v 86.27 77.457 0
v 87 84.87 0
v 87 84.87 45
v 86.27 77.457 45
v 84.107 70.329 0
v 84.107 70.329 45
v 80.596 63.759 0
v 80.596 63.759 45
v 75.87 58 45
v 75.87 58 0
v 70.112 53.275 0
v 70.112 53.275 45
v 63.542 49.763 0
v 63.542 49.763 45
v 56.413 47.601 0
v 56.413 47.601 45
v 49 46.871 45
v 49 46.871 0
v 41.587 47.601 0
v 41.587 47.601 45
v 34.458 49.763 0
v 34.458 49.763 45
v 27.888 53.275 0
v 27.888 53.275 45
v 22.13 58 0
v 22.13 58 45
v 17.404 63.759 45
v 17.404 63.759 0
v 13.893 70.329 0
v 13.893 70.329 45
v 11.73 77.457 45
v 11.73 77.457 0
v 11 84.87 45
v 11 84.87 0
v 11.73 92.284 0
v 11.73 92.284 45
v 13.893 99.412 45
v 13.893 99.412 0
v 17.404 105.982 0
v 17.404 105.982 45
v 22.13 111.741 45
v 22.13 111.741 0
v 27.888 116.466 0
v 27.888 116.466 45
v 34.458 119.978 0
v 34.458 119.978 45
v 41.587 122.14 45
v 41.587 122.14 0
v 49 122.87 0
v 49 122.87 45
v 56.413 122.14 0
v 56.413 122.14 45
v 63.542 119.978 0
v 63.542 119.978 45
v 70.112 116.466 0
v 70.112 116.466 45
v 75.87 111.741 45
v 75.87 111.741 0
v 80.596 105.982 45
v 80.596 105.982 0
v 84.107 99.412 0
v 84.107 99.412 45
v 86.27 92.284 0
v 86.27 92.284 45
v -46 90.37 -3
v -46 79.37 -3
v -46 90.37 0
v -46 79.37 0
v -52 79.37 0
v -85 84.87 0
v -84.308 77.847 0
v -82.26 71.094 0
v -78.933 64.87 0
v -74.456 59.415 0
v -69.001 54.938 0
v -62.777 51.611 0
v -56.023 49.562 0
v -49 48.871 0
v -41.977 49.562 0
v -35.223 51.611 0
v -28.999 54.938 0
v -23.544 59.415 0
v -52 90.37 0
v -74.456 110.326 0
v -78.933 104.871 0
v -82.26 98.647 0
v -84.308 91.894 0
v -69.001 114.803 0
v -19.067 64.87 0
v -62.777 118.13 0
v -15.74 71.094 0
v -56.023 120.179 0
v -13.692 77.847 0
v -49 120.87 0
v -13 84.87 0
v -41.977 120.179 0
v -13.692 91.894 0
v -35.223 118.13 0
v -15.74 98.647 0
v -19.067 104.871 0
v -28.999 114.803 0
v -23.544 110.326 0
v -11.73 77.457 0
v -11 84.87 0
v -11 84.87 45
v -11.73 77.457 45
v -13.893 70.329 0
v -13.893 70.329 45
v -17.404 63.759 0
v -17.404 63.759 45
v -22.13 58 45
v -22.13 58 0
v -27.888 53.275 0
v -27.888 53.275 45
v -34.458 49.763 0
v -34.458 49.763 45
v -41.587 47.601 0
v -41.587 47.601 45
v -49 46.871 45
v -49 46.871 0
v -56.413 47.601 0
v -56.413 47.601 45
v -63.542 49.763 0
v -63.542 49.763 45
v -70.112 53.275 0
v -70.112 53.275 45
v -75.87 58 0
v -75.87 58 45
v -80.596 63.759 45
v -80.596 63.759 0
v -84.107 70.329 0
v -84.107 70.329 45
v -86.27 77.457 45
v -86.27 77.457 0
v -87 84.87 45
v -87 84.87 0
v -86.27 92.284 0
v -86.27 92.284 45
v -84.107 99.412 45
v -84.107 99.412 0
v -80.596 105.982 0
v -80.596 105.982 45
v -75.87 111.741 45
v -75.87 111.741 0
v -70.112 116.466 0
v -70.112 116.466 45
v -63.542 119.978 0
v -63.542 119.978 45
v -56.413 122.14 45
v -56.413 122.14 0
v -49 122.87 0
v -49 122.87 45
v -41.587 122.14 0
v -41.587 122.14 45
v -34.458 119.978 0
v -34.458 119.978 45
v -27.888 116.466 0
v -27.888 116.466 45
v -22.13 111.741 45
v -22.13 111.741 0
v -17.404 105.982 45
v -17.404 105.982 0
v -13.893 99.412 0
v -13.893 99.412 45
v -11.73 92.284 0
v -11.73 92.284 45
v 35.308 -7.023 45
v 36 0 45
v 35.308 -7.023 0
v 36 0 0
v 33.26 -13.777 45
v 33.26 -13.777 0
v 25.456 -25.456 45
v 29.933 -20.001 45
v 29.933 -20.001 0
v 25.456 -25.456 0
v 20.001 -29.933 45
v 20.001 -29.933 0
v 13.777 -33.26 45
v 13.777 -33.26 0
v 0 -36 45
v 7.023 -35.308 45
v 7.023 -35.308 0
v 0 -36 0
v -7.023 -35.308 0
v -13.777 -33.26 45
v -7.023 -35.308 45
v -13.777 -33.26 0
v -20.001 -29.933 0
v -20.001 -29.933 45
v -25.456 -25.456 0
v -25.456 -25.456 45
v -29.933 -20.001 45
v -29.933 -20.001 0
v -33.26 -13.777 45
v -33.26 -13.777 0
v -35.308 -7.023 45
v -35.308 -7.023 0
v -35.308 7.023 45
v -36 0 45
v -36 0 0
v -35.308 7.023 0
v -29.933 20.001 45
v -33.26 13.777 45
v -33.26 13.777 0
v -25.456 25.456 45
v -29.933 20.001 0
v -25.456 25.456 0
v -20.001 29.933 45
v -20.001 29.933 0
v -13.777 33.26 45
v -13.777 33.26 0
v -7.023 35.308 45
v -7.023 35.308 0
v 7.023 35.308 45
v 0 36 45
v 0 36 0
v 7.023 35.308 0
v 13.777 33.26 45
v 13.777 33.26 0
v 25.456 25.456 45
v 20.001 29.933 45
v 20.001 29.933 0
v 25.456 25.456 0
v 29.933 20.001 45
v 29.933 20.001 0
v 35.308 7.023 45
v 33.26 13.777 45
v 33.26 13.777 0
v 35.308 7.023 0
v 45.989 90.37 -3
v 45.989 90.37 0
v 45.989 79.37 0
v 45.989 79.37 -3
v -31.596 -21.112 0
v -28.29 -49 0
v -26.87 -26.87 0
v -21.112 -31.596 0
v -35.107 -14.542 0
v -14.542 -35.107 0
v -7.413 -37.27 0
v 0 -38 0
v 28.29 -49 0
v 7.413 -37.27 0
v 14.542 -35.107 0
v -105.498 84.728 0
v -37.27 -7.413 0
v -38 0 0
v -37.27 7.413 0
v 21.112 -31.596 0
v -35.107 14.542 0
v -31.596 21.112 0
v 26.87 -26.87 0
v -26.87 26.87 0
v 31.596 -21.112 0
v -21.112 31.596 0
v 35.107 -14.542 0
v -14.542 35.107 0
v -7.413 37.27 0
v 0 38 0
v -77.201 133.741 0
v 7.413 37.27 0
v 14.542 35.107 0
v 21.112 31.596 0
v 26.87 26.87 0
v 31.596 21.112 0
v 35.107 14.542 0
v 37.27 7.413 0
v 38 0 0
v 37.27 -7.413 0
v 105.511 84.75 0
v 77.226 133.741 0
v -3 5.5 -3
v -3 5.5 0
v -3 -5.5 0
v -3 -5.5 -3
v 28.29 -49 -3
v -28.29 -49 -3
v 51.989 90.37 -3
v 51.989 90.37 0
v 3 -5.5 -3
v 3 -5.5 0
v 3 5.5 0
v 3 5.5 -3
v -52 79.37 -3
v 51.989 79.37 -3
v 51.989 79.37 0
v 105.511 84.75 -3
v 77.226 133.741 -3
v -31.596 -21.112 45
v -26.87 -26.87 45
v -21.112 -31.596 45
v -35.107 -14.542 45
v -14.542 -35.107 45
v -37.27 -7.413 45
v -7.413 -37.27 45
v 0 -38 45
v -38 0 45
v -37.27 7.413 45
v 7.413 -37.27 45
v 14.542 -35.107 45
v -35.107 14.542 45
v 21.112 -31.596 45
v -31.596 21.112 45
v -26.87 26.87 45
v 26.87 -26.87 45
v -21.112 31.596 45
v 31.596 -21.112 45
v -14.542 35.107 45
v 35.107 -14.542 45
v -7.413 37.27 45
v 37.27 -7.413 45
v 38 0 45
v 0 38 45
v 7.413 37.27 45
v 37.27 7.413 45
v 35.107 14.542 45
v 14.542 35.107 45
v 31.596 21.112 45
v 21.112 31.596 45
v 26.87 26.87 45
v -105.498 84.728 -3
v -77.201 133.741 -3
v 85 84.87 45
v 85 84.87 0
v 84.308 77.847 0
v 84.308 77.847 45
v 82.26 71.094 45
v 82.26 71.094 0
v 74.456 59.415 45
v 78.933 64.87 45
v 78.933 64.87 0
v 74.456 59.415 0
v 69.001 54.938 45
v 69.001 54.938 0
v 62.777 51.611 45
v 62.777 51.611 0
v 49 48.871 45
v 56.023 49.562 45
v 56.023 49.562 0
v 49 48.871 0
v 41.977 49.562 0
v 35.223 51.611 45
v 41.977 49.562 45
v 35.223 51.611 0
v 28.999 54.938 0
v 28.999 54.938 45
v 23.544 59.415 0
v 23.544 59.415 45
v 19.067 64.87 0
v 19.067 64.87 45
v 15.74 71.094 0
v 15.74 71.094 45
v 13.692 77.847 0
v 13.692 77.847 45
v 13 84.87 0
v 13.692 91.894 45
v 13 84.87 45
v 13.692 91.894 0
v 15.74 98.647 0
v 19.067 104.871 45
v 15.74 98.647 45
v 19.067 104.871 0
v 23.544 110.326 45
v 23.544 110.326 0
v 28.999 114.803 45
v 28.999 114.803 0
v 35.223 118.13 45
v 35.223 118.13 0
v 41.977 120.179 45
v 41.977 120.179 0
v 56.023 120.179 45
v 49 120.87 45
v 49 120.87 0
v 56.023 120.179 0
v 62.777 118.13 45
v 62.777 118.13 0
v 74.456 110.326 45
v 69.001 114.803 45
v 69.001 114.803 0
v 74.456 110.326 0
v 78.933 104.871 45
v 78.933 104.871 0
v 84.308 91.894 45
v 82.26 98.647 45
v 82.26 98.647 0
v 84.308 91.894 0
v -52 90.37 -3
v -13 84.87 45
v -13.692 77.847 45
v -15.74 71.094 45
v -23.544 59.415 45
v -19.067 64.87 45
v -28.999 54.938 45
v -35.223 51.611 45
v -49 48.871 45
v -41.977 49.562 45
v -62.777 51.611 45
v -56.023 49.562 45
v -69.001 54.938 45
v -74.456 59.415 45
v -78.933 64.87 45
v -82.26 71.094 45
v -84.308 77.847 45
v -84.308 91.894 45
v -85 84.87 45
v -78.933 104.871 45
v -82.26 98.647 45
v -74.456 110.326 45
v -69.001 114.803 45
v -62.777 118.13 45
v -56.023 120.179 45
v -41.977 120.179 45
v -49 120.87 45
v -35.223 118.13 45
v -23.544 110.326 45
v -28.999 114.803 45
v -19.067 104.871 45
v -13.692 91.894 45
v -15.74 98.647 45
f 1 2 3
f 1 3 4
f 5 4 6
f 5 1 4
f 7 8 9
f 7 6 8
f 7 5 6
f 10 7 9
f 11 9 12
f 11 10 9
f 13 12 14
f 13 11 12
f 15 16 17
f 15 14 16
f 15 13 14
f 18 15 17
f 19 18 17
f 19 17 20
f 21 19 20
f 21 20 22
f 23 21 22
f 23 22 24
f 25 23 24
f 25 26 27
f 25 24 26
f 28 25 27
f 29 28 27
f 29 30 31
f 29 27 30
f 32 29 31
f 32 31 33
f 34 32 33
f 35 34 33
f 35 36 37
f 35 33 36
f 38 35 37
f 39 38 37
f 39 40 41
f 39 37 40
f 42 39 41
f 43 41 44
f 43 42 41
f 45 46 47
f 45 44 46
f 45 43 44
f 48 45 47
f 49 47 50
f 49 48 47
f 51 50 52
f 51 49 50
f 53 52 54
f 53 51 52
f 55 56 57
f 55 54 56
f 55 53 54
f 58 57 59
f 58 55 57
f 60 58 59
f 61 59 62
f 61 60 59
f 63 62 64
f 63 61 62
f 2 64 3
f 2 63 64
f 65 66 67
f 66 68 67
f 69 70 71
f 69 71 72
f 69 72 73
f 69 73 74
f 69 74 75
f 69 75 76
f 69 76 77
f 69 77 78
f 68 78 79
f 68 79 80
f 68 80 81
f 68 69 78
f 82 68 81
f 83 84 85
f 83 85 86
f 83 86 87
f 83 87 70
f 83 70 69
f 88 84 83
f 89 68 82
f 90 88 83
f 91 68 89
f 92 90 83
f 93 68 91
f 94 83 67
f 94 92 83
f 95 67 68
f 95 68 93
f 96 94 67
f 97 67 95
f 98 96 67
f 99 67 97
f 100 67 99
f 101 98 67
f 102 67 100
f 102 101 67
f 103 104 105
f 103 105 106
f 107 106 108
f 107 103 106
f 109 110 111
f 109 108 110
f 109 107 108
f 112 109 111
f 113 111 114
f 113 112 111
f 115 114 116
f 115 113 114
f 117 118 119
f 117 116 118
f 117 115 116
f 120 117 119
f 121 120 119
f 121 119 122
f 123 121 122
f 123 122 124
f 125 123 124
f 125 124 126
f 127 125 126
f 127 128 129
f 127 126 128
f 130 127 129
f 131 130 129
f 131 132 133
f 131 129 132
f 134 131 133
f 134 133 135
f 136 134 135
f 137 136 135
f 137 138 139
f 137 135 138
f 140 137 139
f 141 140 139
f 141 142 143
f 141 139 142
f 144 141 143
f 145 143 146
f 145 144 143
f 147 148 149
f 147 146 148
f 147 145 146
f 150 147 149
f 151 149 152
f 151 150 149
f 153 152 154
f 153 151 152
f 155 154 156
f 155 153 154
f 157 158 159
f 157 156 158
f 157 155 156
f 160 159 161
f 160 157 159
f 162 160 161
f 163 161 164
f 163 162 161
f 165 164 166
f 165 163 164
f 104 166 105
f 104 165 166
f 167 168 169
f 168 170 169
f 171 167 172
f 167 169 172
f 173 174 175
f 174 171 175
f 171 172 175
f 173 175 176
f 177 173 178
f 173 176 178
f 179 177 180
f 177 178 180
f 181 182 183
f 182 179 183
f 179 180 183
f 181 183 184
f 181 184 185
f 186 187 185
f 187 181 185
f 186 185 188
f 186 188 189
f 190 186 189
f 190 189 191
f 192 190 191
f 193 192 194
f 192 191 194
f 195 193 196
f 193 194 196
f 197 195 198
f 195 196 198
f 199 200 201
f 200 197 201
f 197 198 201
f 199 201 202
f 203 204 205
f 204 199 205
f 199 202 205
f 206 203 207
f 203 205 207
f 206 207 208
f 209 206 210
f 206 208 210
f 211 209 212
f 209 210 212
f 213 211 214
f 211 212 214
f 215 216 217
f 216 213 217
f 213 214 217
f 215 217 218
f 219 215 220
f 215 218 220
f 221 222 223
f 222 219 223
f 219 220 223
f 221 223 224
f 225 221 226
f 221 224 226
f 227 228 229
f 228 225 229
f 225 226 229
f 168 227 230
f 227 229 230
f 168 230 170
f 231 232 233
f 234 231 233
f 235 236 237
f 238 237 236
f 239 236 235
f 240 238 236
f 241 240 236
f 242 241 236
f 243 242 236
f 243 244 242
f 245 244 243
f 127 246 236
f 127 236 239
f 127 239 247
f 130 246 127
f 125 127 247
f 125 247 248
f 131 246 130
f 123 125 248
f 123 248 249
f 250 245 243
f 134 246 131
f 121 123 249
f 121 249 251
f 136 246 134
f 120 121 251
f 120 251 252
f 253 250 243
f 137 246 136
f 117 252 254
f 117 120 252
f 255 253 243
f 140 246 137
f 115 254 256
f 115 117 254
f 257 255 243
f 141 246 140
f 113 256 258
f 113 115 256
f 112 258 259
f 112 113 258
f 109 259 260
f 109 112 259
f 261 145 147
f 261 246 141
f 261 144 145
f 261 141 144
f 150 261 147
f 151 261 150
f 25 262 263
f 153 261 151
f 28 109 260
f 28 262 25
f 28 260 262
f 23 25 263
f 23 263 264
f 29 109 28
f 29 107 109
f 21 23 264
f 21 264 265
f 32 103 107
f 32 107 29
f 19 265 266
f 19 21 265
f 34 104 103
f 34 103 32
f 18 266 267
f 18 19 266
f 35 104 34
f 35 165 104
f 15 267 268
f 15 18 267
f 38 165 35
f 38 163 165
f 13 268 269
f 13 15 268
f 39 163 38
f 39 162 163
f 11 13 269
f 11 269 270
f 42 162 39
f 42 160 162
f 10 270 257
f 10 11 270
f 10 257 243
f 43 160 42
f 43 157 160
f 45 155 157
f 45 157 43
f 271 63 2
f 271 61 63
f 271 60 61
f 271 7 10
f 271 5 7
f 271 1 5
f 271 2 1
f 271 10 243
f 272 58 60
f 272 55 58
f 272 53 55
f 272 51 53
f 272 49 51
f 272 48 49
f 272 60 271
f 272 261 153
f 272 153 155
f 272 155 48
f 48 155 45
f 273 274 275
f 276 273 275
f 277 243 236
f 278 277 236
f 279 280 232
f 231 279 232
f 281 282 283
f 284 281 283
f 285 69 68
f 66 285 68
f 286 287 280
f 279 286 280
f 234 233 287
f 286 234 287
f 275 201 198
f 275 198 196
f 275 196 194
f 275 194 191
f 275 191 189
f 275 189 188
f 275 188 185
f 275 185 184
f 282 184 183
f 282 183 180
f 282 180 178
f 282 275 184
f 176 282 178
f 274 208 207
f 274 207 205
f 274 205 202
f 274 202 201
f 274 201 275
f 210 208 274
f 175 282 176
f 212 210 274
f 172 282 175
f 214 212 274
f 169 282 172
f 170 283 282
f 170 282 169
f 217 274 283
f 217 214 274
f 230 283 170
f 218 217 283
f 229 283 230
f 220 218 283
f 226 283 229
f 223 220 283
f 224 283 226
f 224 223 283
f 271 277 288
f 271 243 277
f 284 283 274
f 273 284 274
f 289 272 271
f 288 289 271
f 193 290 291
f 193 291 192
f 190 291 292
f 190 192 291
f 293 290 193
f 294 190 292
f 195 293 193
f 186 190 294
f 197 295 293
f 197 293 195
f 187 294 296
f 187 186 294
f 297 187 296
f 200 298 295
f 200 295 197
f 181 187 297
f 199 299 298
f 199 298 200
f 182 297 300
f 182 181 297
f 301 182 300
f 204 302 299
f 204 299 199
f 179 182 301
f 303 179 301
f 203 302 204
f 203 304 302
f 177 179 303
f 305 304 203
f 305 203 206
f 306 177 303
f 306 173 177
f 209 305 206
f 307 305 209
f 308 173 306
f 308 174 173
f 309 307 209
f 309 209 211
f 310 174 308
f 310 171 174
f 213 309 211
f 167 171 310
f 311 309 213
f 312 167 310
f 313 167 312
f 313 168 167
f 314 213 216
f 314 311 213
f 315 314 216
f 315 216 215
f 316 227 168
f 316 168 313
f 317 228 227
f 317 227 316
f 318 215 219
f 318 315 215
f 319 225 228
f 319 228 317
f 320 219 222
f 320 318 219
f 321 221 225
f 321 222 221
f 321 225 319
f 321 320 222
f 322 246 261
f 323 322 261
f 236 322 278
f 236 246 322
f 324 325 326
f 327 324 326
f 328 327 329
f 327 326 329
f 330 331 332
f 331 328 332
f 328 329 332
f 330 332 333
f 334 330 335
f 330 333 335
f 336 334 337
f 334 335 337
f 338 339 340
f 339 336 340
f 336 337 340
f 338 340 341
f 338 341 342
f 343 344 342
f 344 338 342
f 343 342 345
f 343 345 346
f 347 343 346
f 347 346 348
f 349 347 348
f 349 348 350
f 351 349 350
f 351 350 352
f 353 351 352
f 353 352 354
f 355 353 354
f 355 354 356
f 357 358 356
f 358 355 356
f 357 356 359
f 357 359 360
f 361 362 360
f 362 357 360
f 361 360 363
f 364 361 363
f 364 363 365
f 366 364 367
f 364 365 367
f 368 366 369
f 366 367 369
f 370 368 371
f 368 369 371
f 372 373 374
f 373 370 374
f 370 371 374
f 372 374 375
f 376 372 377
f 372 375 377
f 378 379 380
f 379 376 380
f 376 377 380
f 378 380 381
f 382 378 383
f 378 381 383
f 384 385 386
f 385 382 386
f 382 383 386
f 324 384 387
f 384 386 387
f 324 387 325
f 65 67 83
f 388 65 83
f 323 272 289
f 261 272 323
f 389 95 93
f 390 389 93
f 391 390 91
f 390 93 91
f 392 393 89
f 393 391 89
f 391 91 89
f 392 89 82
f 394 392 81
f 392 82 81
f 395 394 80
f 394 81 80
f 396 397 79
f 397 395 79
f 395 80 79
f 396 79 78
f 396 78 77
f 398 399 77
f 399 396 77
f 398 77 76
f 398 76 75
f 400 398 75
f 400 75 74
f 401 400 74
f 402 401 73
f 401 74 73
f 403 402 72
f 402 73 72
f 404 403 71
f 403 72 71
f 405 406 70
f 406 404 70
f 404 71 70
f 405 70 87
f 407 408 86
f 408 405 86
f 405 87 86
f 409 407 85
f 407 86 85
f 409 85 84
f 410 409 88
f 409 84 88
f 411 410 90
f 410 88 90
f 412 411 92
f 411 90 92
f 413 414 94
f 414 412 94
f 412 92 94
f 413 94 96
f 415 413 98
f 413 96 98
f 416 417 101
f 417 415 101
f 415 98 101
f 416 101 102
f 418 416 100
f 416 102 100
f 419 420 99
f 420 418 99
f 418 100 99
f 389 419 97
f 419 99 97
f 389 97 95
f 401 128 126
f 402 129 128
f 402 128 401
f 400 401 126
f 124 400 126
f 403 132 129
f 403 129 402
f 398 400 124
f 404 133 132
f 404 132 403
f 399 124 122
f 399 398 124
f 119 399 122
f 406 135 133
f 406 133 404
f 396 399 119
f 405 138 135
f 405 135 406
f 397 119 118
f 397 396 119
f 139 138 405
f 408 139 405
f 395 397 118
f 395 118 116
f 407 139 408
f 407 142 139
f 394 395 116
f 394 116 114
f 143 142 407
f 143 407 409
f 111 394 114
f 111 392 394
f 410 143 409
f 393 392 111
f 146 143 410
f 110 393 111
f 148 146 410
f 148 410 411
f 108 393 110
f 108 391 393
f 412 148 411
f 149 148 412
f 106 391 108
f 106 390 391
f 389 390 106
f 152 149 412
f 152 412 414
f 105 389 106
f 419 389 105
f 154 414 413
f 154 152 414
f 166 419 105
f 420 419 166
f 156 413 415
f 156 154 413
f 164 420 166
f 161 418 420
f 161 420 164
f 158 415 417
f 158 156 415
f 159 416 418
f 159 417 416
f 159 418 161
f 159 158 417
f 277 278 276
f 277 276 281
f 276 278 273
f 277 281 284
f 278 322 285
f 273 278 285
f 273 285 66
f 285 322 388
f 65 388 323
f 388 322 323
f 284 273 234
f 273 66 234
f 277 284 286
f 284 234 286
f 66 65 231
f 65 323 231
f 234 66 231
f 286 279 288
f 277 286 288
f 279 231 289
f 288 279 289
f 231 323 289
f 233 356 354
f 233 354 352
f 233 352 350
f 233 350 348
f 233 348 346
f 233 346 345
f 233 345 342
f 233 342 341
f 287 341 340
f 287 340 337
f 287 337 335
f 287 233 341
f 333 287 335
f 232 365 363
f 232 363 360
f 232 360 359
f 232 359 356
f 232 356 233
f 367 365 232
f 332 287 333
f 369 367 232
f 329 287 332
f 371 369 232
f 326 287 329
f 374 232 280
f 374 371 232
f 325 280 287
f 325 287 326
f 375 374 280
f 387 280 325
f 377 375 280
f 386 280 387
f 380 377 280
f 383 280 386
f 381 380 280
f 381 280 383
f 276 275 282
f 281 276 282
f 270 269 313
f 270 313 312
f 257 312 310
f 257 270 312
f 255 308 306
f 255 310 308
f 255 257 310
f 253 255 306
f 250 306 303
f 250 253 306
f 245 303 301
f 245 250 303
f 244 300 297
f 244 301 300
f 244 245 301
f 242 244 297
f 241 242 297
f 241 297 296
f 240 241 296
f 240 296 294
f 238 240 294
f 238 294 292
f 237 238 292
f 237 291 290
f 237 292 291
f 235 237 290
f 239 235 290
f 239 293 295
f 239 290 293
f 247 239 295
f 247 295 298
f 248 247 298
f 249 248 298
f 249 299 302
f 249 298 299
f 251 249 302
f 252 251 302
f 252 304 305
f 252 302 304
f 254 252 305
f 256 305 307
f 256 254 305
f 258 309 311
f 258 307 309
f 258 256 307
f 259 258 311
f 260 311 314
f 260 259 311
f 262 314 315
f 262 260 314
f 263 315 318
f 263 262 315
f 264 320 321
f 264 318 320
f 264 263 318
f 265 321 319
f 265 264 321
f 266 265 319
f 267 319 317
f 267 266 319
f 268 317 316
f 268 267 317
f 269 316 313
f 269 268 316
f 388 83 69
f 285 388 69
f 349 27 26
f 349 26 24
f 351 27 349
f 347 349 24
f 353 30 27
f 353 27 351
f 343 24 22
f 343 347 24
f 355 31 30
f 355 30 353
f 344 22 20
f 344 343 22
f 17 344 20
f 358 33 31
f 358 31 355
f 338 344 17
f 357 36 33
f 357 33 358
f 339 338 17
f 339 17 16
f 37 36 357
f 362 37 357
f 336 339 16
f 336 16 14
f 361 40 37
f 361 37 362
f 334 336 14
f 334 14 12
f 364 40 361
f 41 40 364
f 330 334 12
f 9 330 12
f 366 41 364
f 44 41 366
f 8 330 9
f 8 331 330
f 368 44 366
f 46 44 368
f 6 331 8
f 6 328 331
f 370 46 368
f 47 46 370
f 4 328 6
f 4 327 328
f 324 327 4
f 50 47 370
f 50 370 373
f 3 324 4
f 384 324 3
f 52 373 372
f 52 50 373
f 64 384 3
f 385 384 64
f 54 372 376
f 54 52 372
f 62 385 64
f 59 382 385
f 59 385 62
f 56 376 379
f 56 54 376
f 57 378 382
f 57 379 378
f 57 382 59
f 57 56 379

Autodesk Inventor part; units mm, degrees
ref_plane "YZ Plane" through (0, 0, 0) normal (1, 0, 0) x (0, 1, 0)
ref_plane "XZ Plane" through (0, 0, 0) normal (0, 1, 0) x (-1, 0, 0)
ref_plane "XY Plane" through (0, 0, 0) normal (0, 0, 1) x (1, 0, 0)
sketch "Sketch1" plane through (0, 0, 0) normal (0, 0, 1) x (1, 0, 0)
  circle A0 centre (0, 0) radius 49 construction
  line L0 (0, 0) -> (49, 0) construction
  circle A1 centre (49, 84.8705) radius 49 construction
  circle A2 centre (-49, 84.8705) radius 49 construction
  circle A3 centre (0, 169.741) radius 49 construction
  circle A4 centre (-98, 169.741) radius 49 construction
  circle A5 centre (98, 169.741) radius 49 construction
  circle A6 centre (-49, 84.8705) radius 36
  circle A7 centre (-98, 169.741) radius 36 construction
  circle A8 centre (0, 169.741) radius 36 construction
  circle A9 centre (98, 169.741) radius 36 construction
  circle A10 centre (49, 84.8705) radius 36
  circle A11 centre (0, 0) radius 36
  line L1 (0, 0) -> (34.6482, -34.6482) construction
  line L2 (0, 0) -> (49, 0) construction
  line L3 (-183.7192, 220.2111) -> (183.7192, 220.2111) construction
  line L4 (-52.5602, 133.741) -> (45.4398, 133.741) construction
  line L5 (-52.5602, 133.741) -> (-77.2006, 133.741) construction
  line L6 (-52.5602, 133.741) -> (28.6753, 133.741) construction
  line L7 (45.4398, 133.741) -> (133.7957, 133.741) construction
  line L8 (45.4398, 133.741) -> (77.2264, 133.741) construction
  circle A12 centre (-49, 84.8705) radius 38
  circle A13 centre (49, 84.8705) radius 38
  circle A14 centre (0, 0) radius 38
  circle A15 centre (0, 169.741) radius 38 construction
  circle A16 centre (98, 169.741) radius 38 construction
  line L9 (-140.4352, 194.241) -> (-125.4414, 220.2111) construction
  line L10 (-140.4352, 194.241) -> (-154.5803, 169.741) construction
  line L11 (140.4352, 194.241) -> (125.4414, 220.2111) construction
  line L12 (140.4352, 194.241) -> (154.5803, 169.741) construction
  line L13 (0, -49) -> (28.2902, -49) construction
  line L14 (0, -49) -> (-28.2902, -49) construction
  line L15 (0, 207.741) -> (0, -38) construction
  circle A17 centre (-98, 169.741) radius 38 construction
  line L16 (-136, 169.741) -> (136, 169.741) construction
  line L17 (-133.7957, 133.741) -> (-183.7192, 220.2111) construction
  line L18 (133.7957, 133.741) -> (183.7192, 220.2111) construction
  line L19 (-28.2902, -49) -> (-105.4982, 84.7282) construction
  line L20 (28.2902, -49) -> (105.511, 84.7505) construction
  line L21 (-93.178, 106.0673) -> (-77.2006, 133.741) construction
  line L22 (-93.178, 106.0673) -> (-61.2232, 106.0673) construction
  line L23 (-93.178, 106.0673) -> (-105.4982, 84.7282) construction
  line L24 (-77.2006, 133.741) -> (-133.7957, 133.741) construction
  line L25 (-105.4982, 84.7282) -> (-133.7957, 133.741) construction
  line L26 (89.6177, 112.2785) -> (77.2264, 133.741) construction
  line L27 (89.6177, 112.2785) -> (114.4005, 112.2785) construction
  line L28 (89.6177, 112.2785) -> (105.511, 84.7505) construction
  line L29 (77.2264, 133.741) -> (133.7957, 133.741) construction
  line L30 (105.511, 84.7505) -> (133.7957, 133.741) construction
  line L31 (77.2264, 133.741) -> (-77.2006, 133.741) construction
  line L32 (77.2264, 133.741) -> (-77.2006, 133.741)
  line L33 (-105.4982, 84.7282) -> (-77.2006, 133.741)
  line L34 (-105.4982, 84.7282) -> (-28.2902, -49)
  line L35 (28.2902, -49) -> (-28.2902, -49)
  line L36 (28.2902, -49) -> (105.511, 84.7505)
  line L37 (77.2264, 133.741) -> (105.511, 84.7505)
  dimension "d6" = 98
  dimension "d7" = 98
  dimension "d19" = 76
  dimension "d20" = 76
  dimension "d21" = 76
  dimension "d22" = 76
  dimension "d0" = 98
  dimension "d3" = 98
  dimension "d4" = 98
  dimension "d5" = 98
  dimension "d8" = 72
  dimension "d9" = 72
  dimension "d10" = 72
  dimension "d11" = 72
  dimension "d12" = 72
  dimension "d13" = 72
  dimension "d14" = 45
  dimension "d15" = 180
  dimension "d16" = 0
  dimension "d17" = 76
  dimension "d18" = 76
  dimension "d23" = 60
  dimension "d24" = 120
extrude "Extrusion1" add sketch "Sketch1" along normal blind 45 contours A12 | A13 | A14
extrude "Extrusion2" add sketch "Sketch1" against normal blind 3 contours A6 | A10 | A11 | A12 | A13 | A14 | L37 L36 L35 L34 L33 L32
sketch "Sketch2" plane through (-49, 84.8705, 0) normal (0, 0, 1) x (1, 0, 0)
  line L0 (-3, -5.5) -> (3, -5.5)
  line L1 (3, -5.5) -> (3, 5.5)
  line L2 (3, 5.5) -> (-3, 5.5)
  line L3 (-3, 5.5) -> (-3, -5.5)
  line L4 (-3, -5.5) -> (3, 5.5) construction
  line L5 (3, -5.5) -> (-3, 5.5) construction
  line L6 (94.9892, -5.5) -> (100.9892, -5.5)
  line L7 (100.9892, -5.5) -> (100.9892, 5.5)
  line L8 (100.9892, 5.5) -> (94.9892, 5.5)
  line L9 (94.9892, 5.5) -> (94.9892, -5.5)
  line L10 (94.9892, -5.5) -> (100.9892, 5.5) construction
  line L11 (100.9892, -5.5) -> (94.9892, 5.5) construction
  line L12 (46, -90.3705) -> (52, -90.3705)
  line L13 (52, -90.3705) -> (52, -79.3705)
  line L14 (52, -79.3705) -> (46, -79.3705)
  line L15 (46, -79.3705) -> (46, -90.3705)
  line L16 (46, -90.3705) -> (52, -79.3705) construction
  line L17 (52, -90.3705) -> (46, -79.3705) construction
  point P0 (49, -84.8705)
  point P1 (0, 0)
  point P2 (97.9892, 0)
  dimension "d29" = 6
  dimension "d30" = 11
  dimension "d31" = 6
  dimension "d32" = 11
  dimension "d33" = 6
  dimension "d34" = 11
extrude "Extrusion3" cut sketch "Sketch2" against normal blind 3
properties part number "base"
